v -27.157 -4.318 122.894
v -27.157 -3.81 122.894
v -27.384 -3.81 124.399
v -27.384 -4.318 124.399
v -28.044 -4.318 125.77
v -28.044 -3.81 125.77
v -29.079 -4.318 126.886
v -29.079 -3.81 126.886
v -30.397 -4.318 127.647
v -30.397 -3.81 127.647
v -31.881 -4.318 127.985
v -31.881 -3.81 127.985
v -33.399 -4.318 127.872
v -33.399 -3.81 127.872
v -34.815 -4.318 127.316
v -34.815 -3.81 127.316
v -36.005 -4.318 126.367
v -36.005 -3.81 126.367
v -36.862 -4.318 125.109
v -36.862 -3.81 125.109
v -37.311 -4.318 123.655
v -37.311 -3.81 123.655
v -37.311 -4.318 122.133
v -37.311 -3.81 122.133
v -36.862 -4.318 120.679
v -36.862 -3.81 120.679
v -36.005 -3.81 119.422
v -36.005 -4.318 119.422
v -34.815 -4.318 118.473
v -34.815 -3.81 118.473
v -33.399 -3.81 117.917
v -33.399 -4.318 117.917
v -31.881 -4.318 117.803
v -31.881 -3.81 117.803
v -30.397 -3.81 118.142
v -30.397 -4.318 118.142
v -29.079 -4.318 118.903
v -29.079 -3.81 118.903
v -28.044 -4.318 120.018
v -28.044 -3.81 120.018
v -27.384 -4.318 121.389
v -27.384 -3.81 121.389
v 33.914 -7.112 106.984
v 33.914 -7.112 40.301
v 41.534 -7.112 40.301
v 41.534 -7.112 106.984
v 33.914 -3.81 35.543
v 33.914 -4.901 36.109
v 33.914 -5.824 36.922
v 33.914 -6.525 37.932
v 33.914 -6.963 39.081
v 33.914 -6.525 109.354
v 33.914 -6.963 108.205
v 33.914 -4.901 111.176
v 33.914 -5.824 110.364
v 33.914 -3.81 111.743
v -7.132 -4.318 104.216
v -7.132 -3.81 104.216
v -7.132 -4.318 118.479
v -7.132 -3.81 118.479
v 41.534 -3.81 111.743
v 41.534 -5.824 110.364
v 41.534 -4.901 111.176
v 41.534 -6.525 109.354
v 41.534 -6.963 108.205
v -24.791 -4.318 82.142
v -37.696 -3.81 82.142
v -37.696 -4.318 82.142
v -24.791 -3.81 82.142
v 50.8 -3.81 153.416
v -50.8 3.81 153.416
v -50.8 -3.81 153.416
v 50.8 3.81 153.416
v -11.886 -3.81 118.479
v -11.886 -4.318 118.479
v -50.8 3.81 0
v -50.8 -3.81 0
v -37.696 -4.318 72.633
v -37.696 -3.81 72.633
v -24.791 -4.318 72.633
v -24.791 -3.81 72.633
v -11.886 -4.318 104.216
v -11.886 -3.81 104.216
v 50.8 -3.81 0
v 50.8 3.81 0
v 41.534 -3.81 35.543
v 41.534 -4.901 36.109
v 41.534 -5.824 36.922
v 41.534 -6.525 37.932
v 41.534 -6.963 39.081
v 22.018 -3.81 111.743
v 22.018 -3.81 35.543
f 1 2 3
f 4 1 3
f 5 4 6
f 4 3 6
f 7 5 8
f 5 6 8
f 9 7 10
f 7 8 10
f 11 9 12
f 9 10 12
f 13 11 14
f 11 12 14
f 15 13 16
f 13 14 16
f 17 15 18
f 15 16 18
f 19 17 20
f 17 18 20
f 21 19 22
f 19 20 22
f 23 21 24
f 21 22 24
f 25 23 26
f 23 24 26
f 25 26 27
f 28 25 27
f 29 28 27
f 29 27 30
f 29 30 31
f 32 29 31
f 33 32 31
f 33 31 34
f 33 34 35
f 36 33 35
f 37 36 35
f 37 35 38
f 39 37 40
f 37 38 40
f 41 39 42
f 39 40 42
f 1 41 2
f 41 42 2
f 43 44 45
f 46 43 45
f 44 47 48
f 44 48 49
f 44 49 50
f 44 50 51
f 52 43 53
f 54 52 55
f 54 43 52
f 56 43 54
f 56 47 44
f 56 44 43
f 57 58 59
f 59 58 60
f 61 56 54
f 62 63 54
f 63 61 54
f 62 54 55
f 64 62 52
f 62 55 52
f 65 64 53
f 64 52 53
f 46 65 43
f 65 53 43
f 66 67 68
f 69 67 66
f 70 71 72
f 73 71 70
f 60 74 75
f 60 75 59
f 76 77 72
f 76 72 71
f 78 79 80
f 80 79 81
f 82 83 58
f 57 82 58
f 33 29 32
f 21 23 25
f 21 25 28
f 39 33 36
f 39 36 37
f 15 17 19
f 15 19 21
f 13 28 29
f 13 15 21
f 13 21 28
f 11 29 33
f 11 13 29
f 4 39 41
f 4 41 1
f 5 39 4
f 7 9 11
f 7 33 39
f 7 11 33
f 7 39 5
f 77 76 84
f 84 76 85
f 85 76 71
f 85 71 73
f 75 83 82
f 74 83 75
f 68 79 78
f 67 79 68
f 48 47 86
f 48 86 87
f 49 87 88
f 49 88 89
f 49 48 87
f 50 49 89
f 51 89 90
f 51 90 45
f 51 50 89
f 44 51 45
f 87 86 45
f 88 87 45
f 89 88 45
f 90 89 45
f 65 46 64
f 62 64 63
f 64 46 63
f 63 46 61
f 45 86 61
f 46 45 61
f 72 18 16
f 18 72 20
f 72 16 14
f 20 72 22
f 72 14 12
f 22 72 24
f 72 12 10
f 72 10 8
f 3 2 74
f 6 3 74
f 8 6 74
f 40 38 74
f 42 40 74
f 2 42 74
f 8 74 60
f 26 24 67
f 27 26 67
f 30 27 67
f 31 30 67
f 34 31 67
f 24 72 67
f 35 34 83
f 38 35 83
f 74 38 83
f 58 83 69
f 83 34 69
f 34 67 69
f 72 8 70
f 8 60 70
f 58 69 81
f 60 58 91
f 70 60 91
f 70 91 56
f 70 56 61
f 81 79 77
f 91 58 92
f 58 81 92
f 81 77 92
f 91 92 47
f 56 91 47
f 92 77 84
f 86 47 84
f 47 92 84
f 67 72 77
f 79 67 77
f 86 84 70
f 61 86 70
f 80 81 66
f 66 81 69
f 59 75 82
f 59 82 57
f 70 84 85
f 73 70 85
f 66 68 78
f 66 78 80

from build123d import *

# Parameters (mm, degrees)
F0_W        = 101.6
F0_H        = 7.62
F1_DEPTH    = 153.416
F2_W        = 7.62
F2_H        = 76.2
F3_DEPTH    = 3.302
F4_T1_DEPTH = 31.4134423739
F5_R        = 5.1053850436
F5_W        = 4.7544753179
F5_H        = 14.2634212971
F5_W_2      = 12.9049904644
F5_H_2      = 9.5089375973
F6_DEPTH    = 0.508


# Not quite as in the source:
# - a fillet or chamfer that OpenCascade refuses, or shapes differently, is made with other operations: its cross-section is extruded or revolved along the edge and cut away or added


with BuildPart() as f1:
    # F0 (on Top) → F1 (new body)
    with BuildSketch(Plane.XY):
        Rectangle(F0_W, F0_H)
    extrude(amount=F1_DEPTH)

    # F2 (on face) → F3 (join)
    with BuildSketch(Plane.XZ.offset(3.81)):
        with Locations((37.7244745995, 73.6427996308)):
            Rectangle(F2_W, F2_H)
    extrude(amount=F3_DEPTH)

    # F4: fillet of radius 5.08 on 2 edges, made by hand

    # F4_s2 → F4_t1 (cut)
    with BuildSketch(Plane.YZ.offset(22.0177534125)):
        with BuildLine():
            ThreePointArc((-3.81, 111.7427996308), (-6.2056458882, 109.8801567357), (-7.112, 106.984111156))
            Line((-7.112, 106.984111156), (-7.112, 111.7427996308))
            Line((-7.112, 111.7427996308), (-3.81, 111.7427996308))
        make_face()
        with BuildLine():
            ThreePointArc((-3.81, 35.5427996308), (-6.2056458882, 37.4054425258), (-7.112, 40.3014881055))
            Line((-7.112, 40.3014881055), (-7.112, 35.5427996308))
            Line((-7.112, 35.5427996308), (-3.81, 35.5427996308))
        make_face()
    extrude(amount=F4_T1_DEPTH, mode=Mode.SUBTRACT)

    # F5 (on face) → F6 (join)
    with BuildSketch(Plane.XZ.offset(3.81)):
        with Locations((-32.2624817491, 122.8942871094)):
            Circle(F5_R)
        with Locations((-9.5089431852, 111.3477125764)):
            Rectangle(F5_W, F5_H)
        with Locations((-31.2436651438, 77.3872062564)):
            Rectangle(F5_W_2, F5_H_2)
    extrude(amount=F6_DEPTH)


solid = f1.part
